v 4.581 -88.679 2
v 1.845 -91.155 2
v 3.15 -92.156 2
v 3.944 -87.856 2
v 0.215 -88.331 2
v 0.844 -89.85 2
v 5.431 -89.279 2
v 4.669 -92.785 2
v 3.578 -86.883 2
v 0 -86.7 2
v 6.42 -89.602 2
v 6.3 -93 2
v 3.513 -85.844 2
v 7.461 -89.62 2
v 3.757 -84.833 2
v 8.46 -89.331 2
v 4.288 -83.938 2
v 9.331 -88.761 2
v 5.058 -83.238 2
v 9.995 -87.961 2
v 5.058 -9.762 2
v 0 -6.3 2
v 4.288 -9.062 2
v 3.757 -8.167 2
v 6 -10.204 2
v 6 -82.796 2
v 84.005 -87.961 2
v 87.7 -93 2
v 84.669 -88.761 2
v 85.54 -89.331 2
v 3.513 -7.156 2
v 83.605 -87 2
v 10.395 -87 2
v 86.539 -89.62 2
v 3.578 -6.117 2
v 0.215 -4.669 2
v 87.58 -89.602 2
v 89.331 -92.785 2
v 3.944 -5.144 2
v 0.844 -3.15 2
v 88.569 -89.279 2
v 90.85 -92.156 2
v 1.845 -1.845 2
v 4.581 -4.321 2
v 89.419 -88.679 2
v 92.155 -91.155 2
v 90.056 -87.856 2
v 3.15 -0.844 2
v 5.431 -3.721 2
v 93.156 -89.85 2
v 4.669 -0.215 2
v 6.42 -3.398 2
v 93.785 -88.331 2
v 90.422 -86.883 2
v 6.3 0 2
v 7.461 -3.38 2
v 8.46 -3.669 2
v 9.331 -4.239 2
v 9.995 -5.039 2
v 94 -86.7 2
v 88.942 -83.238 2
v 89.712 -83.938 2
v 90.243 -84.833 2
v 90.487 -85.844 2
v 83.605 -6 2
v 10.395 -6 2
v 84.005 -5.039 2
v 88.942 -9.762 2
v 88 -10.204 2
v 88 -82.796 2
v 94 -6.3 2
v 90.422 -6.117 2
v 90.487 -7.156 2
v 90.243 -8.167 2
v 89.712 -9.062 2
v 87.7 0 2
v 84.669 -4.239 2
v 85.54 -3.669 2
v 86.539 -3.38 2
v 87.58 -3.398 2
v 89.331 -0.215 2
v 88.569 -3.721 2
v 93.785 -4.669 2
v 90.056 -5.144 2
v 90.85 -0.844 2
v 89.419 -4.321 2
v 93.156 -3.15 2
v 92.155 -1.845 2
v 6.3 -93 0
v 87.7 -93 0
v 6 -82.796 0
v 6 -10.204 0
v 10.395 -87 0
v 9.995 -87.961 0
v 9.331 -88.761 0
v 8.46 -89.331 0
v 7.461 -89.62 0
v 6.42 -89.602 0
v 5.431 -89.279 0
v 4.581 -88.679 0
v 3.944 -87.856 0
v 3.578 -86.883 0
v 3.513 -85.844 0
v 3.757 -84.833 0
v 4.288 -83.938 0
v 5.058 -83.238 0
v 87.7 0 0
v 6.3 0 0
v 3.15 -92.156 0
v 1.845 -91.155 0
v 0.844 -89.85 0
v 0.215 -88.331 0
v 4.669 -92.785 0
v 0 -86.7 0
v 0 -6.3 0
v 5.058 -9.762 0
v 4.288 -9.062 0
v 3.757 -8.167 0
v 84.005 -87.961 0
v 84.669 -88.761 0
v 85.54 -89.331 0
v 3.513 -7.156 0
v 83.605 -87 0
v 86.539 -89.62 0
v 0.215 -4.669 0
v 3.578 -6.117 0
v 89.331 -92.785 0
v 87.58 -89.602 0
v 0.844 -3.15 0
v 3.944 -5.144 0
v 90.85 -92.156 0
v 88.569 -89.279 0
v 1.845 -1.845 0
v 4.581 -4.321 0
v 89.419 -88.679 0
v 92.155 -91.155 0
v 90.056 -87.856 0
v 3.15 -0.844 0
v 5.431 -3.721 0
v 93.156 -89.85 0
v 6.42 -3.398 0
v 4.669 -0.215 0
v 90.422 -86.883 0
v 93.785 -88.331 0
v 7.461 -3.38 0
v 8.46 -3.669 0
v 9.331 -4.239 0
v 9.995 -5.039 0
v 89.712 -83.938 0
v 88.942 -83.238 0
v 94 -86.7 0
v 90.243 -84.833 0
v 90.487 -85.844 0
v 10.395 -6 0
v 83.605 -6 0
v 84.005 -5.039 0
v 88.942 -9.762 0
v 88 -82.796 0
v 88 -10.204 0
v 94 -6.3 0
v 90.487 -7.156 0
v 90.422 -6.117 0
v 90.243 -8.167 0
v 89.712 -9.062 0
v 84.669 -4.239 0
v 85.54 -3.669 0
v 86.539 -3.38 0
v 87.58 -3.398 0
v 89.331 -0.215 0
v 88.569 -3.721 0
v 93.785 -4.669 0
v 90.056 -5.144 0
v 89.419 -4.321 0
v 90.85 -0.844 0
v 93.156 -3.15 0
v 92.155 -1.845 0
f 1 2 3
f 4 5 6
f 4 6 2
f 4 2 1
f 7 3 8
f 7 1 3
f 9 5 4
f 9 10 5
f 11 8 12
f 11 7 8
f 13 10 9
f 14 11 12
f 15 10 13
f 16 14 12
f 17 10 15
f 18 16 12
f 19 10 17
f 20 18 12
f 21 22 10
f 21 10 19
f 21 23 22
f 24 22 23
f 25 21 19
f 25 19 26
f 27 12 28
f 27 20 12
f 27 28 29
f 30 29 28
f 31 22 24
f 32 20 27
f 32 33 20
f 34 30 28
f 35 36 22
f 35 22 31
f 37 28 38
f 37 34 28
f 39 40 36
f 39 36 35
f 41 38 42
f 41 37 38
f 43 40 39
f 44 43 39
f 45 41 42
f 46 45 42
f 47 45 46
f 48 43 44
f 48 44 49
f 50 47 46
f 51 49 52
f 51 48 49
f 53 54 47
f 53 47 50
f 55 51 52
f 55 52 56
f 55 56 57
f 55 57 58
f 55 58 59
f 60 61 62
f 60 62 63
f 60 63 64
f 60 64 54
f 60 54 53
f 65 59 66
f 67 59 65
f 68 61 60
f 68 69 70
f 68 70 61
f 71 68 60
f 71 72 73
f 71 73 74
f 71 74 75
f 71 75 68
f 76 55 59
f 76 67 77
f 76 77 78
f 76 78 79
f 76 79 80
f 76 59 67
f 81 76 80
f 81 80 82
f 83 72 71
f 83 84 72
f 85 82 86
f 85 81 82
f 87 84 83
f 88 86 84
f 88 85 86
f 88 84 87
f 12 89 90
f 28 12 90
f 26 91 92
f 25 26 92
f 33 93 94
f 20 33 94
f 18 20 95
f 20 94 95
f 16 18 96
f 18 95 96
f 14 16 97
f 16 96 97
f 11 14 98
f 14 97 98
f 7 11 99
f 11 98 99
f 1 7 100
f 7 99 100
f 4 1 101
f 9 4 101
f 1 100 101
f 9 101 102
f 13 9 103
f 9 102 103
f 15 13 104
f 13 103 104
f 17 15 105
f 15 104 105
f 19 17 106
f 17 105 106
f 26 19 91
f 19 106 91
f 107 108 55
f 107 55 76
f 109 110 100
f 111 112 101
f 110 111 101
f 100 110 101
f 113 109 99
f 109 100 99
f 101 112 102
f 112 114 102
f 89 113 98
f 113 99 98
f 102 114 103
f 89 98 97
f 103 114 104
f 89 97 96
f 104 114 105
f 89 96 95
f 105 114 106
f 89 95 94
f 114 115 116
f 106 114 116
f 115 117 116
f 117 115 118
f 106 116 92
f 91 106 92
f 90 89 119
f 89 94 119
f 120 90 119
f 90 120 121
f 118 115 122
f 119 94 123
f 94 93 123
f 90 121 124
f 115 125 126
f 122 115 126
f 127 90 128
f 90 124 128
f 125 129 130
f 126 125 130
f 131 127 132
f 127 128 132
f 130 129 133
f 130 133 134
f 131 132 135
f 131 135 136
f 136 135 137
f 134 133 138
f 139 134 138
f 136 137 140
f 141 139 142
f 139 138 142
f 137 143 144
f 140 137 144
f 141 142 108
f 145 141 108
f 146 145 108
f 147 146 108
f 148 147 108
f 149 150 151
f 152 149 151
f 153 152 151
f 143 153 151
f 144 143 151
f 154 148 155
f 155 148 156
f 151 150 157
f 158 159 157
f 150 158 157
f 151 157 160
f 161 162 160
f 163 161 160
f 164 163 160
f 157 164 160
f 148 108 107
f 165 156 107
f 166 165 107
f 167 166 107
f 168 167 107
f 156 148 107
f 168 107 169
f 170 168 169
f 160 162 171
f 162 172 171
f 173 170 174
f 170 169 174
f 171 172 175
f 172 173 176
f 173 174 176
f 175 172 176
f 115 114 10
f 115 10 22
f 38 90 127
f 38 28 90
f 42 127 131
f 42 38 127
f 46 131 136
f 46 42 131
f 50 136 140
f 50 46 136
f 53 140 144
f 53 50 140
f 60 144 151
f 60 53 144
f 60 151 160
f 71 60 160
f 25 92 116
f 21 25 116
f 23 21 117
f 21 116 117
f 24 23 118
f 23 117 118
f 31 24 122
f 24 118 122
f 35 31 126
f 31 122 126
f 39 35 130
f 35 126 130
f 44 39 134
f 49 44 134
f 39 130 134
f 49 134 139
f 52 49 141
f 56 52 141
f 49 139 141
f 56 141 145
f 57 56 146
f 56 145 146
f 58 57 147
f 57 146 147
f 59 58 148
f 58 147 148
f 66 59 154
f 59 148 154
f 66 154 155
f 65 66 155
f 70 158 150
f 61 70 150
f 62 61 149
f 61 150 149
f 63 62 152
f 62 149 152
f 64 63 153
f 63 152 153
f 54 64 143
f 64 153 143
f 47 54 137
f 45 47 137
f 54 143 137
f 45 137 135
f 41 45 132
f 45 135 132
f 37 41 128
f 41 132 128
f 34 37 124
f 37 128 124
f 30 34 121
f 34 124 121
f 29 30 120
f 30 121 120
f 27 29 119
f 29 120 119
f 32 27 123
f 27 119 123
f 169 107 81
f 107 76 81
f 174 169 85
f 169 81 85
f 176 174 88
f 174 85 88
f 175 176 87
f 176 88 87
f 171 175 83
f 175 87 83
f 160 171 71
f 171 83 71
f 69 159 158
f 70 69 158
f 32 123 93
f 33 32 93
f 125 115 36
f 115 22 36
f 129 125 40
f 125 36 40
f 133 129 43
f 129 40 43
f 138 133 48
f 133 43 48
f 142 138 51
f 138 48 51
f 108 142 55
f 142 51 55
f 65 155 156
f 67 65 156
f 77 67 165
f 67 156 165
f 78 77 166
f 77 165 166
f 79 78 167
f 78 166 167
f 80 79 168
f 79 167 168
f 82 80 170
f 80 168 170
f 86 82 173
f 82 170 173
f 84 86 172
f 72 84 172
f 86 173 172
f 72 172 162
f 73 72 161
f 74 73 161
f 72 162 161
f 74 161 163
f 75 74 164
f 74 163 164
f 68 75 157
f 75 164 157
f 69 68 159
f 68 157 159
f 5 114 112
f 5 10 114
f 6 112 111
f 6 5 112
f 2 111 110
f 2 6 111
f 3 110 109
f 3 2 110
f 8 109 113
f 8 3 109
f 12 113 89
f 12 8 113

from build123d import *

# Parameters (mm, degrees)
ESQUISSE1_W      = 94
ESQUISSE1_H      = 93
EXTRUSION1_DEPTH = 2
CONG_1_R         = 6.3


with BuildPart() as part:
    # Esquisse1 → Extrusion1 (new body)
    with BuildSketch(Plane.XY):
        with Locations((47, -46.5)):
            Rectangle(ESQUISSE1_W, ESQUISSE1_H)
        with BuildLine():
            Line((88, -10.204101966), (88, -82.795898034))
            ThreePointArc((88, -82.795898034), (89.419273594, -88.67925192), (83.604782776, -87))
            Line((83.604782776, -87), (10.395217224, -87))
            ThreePointArc((10.395217224, -87), (4.580726406, -88.67925192), (6, -82.795898034))
            Line((6, -82.795898034), (6, -10.204101966))
            ThreePointArc((6, -10.204101966), (4.580726406, -4.32074808), (10.395217224, -6))
            Line((10.395217224, -6), (83.604782776, -6))
            ThreePointArc((83.604782776, -6), (89.419273594, -4.32074808), (88, -10.204101966))
        make_face(mode=Mode.SUBTRACT)
    extrude(amount=EXTRUSION1_DEPTH)

    # Congé1
    cong_1_edges = [part.edges().sort_by_distance(p)[0] for p in [
        (0, -93, 1),
        (0, 0, 1),
        (94, 0, 1),
        (94, -93, 1),
    ]]
    fillet(cong_1_edges, radius=CONG_1_R)


solid = part.part
